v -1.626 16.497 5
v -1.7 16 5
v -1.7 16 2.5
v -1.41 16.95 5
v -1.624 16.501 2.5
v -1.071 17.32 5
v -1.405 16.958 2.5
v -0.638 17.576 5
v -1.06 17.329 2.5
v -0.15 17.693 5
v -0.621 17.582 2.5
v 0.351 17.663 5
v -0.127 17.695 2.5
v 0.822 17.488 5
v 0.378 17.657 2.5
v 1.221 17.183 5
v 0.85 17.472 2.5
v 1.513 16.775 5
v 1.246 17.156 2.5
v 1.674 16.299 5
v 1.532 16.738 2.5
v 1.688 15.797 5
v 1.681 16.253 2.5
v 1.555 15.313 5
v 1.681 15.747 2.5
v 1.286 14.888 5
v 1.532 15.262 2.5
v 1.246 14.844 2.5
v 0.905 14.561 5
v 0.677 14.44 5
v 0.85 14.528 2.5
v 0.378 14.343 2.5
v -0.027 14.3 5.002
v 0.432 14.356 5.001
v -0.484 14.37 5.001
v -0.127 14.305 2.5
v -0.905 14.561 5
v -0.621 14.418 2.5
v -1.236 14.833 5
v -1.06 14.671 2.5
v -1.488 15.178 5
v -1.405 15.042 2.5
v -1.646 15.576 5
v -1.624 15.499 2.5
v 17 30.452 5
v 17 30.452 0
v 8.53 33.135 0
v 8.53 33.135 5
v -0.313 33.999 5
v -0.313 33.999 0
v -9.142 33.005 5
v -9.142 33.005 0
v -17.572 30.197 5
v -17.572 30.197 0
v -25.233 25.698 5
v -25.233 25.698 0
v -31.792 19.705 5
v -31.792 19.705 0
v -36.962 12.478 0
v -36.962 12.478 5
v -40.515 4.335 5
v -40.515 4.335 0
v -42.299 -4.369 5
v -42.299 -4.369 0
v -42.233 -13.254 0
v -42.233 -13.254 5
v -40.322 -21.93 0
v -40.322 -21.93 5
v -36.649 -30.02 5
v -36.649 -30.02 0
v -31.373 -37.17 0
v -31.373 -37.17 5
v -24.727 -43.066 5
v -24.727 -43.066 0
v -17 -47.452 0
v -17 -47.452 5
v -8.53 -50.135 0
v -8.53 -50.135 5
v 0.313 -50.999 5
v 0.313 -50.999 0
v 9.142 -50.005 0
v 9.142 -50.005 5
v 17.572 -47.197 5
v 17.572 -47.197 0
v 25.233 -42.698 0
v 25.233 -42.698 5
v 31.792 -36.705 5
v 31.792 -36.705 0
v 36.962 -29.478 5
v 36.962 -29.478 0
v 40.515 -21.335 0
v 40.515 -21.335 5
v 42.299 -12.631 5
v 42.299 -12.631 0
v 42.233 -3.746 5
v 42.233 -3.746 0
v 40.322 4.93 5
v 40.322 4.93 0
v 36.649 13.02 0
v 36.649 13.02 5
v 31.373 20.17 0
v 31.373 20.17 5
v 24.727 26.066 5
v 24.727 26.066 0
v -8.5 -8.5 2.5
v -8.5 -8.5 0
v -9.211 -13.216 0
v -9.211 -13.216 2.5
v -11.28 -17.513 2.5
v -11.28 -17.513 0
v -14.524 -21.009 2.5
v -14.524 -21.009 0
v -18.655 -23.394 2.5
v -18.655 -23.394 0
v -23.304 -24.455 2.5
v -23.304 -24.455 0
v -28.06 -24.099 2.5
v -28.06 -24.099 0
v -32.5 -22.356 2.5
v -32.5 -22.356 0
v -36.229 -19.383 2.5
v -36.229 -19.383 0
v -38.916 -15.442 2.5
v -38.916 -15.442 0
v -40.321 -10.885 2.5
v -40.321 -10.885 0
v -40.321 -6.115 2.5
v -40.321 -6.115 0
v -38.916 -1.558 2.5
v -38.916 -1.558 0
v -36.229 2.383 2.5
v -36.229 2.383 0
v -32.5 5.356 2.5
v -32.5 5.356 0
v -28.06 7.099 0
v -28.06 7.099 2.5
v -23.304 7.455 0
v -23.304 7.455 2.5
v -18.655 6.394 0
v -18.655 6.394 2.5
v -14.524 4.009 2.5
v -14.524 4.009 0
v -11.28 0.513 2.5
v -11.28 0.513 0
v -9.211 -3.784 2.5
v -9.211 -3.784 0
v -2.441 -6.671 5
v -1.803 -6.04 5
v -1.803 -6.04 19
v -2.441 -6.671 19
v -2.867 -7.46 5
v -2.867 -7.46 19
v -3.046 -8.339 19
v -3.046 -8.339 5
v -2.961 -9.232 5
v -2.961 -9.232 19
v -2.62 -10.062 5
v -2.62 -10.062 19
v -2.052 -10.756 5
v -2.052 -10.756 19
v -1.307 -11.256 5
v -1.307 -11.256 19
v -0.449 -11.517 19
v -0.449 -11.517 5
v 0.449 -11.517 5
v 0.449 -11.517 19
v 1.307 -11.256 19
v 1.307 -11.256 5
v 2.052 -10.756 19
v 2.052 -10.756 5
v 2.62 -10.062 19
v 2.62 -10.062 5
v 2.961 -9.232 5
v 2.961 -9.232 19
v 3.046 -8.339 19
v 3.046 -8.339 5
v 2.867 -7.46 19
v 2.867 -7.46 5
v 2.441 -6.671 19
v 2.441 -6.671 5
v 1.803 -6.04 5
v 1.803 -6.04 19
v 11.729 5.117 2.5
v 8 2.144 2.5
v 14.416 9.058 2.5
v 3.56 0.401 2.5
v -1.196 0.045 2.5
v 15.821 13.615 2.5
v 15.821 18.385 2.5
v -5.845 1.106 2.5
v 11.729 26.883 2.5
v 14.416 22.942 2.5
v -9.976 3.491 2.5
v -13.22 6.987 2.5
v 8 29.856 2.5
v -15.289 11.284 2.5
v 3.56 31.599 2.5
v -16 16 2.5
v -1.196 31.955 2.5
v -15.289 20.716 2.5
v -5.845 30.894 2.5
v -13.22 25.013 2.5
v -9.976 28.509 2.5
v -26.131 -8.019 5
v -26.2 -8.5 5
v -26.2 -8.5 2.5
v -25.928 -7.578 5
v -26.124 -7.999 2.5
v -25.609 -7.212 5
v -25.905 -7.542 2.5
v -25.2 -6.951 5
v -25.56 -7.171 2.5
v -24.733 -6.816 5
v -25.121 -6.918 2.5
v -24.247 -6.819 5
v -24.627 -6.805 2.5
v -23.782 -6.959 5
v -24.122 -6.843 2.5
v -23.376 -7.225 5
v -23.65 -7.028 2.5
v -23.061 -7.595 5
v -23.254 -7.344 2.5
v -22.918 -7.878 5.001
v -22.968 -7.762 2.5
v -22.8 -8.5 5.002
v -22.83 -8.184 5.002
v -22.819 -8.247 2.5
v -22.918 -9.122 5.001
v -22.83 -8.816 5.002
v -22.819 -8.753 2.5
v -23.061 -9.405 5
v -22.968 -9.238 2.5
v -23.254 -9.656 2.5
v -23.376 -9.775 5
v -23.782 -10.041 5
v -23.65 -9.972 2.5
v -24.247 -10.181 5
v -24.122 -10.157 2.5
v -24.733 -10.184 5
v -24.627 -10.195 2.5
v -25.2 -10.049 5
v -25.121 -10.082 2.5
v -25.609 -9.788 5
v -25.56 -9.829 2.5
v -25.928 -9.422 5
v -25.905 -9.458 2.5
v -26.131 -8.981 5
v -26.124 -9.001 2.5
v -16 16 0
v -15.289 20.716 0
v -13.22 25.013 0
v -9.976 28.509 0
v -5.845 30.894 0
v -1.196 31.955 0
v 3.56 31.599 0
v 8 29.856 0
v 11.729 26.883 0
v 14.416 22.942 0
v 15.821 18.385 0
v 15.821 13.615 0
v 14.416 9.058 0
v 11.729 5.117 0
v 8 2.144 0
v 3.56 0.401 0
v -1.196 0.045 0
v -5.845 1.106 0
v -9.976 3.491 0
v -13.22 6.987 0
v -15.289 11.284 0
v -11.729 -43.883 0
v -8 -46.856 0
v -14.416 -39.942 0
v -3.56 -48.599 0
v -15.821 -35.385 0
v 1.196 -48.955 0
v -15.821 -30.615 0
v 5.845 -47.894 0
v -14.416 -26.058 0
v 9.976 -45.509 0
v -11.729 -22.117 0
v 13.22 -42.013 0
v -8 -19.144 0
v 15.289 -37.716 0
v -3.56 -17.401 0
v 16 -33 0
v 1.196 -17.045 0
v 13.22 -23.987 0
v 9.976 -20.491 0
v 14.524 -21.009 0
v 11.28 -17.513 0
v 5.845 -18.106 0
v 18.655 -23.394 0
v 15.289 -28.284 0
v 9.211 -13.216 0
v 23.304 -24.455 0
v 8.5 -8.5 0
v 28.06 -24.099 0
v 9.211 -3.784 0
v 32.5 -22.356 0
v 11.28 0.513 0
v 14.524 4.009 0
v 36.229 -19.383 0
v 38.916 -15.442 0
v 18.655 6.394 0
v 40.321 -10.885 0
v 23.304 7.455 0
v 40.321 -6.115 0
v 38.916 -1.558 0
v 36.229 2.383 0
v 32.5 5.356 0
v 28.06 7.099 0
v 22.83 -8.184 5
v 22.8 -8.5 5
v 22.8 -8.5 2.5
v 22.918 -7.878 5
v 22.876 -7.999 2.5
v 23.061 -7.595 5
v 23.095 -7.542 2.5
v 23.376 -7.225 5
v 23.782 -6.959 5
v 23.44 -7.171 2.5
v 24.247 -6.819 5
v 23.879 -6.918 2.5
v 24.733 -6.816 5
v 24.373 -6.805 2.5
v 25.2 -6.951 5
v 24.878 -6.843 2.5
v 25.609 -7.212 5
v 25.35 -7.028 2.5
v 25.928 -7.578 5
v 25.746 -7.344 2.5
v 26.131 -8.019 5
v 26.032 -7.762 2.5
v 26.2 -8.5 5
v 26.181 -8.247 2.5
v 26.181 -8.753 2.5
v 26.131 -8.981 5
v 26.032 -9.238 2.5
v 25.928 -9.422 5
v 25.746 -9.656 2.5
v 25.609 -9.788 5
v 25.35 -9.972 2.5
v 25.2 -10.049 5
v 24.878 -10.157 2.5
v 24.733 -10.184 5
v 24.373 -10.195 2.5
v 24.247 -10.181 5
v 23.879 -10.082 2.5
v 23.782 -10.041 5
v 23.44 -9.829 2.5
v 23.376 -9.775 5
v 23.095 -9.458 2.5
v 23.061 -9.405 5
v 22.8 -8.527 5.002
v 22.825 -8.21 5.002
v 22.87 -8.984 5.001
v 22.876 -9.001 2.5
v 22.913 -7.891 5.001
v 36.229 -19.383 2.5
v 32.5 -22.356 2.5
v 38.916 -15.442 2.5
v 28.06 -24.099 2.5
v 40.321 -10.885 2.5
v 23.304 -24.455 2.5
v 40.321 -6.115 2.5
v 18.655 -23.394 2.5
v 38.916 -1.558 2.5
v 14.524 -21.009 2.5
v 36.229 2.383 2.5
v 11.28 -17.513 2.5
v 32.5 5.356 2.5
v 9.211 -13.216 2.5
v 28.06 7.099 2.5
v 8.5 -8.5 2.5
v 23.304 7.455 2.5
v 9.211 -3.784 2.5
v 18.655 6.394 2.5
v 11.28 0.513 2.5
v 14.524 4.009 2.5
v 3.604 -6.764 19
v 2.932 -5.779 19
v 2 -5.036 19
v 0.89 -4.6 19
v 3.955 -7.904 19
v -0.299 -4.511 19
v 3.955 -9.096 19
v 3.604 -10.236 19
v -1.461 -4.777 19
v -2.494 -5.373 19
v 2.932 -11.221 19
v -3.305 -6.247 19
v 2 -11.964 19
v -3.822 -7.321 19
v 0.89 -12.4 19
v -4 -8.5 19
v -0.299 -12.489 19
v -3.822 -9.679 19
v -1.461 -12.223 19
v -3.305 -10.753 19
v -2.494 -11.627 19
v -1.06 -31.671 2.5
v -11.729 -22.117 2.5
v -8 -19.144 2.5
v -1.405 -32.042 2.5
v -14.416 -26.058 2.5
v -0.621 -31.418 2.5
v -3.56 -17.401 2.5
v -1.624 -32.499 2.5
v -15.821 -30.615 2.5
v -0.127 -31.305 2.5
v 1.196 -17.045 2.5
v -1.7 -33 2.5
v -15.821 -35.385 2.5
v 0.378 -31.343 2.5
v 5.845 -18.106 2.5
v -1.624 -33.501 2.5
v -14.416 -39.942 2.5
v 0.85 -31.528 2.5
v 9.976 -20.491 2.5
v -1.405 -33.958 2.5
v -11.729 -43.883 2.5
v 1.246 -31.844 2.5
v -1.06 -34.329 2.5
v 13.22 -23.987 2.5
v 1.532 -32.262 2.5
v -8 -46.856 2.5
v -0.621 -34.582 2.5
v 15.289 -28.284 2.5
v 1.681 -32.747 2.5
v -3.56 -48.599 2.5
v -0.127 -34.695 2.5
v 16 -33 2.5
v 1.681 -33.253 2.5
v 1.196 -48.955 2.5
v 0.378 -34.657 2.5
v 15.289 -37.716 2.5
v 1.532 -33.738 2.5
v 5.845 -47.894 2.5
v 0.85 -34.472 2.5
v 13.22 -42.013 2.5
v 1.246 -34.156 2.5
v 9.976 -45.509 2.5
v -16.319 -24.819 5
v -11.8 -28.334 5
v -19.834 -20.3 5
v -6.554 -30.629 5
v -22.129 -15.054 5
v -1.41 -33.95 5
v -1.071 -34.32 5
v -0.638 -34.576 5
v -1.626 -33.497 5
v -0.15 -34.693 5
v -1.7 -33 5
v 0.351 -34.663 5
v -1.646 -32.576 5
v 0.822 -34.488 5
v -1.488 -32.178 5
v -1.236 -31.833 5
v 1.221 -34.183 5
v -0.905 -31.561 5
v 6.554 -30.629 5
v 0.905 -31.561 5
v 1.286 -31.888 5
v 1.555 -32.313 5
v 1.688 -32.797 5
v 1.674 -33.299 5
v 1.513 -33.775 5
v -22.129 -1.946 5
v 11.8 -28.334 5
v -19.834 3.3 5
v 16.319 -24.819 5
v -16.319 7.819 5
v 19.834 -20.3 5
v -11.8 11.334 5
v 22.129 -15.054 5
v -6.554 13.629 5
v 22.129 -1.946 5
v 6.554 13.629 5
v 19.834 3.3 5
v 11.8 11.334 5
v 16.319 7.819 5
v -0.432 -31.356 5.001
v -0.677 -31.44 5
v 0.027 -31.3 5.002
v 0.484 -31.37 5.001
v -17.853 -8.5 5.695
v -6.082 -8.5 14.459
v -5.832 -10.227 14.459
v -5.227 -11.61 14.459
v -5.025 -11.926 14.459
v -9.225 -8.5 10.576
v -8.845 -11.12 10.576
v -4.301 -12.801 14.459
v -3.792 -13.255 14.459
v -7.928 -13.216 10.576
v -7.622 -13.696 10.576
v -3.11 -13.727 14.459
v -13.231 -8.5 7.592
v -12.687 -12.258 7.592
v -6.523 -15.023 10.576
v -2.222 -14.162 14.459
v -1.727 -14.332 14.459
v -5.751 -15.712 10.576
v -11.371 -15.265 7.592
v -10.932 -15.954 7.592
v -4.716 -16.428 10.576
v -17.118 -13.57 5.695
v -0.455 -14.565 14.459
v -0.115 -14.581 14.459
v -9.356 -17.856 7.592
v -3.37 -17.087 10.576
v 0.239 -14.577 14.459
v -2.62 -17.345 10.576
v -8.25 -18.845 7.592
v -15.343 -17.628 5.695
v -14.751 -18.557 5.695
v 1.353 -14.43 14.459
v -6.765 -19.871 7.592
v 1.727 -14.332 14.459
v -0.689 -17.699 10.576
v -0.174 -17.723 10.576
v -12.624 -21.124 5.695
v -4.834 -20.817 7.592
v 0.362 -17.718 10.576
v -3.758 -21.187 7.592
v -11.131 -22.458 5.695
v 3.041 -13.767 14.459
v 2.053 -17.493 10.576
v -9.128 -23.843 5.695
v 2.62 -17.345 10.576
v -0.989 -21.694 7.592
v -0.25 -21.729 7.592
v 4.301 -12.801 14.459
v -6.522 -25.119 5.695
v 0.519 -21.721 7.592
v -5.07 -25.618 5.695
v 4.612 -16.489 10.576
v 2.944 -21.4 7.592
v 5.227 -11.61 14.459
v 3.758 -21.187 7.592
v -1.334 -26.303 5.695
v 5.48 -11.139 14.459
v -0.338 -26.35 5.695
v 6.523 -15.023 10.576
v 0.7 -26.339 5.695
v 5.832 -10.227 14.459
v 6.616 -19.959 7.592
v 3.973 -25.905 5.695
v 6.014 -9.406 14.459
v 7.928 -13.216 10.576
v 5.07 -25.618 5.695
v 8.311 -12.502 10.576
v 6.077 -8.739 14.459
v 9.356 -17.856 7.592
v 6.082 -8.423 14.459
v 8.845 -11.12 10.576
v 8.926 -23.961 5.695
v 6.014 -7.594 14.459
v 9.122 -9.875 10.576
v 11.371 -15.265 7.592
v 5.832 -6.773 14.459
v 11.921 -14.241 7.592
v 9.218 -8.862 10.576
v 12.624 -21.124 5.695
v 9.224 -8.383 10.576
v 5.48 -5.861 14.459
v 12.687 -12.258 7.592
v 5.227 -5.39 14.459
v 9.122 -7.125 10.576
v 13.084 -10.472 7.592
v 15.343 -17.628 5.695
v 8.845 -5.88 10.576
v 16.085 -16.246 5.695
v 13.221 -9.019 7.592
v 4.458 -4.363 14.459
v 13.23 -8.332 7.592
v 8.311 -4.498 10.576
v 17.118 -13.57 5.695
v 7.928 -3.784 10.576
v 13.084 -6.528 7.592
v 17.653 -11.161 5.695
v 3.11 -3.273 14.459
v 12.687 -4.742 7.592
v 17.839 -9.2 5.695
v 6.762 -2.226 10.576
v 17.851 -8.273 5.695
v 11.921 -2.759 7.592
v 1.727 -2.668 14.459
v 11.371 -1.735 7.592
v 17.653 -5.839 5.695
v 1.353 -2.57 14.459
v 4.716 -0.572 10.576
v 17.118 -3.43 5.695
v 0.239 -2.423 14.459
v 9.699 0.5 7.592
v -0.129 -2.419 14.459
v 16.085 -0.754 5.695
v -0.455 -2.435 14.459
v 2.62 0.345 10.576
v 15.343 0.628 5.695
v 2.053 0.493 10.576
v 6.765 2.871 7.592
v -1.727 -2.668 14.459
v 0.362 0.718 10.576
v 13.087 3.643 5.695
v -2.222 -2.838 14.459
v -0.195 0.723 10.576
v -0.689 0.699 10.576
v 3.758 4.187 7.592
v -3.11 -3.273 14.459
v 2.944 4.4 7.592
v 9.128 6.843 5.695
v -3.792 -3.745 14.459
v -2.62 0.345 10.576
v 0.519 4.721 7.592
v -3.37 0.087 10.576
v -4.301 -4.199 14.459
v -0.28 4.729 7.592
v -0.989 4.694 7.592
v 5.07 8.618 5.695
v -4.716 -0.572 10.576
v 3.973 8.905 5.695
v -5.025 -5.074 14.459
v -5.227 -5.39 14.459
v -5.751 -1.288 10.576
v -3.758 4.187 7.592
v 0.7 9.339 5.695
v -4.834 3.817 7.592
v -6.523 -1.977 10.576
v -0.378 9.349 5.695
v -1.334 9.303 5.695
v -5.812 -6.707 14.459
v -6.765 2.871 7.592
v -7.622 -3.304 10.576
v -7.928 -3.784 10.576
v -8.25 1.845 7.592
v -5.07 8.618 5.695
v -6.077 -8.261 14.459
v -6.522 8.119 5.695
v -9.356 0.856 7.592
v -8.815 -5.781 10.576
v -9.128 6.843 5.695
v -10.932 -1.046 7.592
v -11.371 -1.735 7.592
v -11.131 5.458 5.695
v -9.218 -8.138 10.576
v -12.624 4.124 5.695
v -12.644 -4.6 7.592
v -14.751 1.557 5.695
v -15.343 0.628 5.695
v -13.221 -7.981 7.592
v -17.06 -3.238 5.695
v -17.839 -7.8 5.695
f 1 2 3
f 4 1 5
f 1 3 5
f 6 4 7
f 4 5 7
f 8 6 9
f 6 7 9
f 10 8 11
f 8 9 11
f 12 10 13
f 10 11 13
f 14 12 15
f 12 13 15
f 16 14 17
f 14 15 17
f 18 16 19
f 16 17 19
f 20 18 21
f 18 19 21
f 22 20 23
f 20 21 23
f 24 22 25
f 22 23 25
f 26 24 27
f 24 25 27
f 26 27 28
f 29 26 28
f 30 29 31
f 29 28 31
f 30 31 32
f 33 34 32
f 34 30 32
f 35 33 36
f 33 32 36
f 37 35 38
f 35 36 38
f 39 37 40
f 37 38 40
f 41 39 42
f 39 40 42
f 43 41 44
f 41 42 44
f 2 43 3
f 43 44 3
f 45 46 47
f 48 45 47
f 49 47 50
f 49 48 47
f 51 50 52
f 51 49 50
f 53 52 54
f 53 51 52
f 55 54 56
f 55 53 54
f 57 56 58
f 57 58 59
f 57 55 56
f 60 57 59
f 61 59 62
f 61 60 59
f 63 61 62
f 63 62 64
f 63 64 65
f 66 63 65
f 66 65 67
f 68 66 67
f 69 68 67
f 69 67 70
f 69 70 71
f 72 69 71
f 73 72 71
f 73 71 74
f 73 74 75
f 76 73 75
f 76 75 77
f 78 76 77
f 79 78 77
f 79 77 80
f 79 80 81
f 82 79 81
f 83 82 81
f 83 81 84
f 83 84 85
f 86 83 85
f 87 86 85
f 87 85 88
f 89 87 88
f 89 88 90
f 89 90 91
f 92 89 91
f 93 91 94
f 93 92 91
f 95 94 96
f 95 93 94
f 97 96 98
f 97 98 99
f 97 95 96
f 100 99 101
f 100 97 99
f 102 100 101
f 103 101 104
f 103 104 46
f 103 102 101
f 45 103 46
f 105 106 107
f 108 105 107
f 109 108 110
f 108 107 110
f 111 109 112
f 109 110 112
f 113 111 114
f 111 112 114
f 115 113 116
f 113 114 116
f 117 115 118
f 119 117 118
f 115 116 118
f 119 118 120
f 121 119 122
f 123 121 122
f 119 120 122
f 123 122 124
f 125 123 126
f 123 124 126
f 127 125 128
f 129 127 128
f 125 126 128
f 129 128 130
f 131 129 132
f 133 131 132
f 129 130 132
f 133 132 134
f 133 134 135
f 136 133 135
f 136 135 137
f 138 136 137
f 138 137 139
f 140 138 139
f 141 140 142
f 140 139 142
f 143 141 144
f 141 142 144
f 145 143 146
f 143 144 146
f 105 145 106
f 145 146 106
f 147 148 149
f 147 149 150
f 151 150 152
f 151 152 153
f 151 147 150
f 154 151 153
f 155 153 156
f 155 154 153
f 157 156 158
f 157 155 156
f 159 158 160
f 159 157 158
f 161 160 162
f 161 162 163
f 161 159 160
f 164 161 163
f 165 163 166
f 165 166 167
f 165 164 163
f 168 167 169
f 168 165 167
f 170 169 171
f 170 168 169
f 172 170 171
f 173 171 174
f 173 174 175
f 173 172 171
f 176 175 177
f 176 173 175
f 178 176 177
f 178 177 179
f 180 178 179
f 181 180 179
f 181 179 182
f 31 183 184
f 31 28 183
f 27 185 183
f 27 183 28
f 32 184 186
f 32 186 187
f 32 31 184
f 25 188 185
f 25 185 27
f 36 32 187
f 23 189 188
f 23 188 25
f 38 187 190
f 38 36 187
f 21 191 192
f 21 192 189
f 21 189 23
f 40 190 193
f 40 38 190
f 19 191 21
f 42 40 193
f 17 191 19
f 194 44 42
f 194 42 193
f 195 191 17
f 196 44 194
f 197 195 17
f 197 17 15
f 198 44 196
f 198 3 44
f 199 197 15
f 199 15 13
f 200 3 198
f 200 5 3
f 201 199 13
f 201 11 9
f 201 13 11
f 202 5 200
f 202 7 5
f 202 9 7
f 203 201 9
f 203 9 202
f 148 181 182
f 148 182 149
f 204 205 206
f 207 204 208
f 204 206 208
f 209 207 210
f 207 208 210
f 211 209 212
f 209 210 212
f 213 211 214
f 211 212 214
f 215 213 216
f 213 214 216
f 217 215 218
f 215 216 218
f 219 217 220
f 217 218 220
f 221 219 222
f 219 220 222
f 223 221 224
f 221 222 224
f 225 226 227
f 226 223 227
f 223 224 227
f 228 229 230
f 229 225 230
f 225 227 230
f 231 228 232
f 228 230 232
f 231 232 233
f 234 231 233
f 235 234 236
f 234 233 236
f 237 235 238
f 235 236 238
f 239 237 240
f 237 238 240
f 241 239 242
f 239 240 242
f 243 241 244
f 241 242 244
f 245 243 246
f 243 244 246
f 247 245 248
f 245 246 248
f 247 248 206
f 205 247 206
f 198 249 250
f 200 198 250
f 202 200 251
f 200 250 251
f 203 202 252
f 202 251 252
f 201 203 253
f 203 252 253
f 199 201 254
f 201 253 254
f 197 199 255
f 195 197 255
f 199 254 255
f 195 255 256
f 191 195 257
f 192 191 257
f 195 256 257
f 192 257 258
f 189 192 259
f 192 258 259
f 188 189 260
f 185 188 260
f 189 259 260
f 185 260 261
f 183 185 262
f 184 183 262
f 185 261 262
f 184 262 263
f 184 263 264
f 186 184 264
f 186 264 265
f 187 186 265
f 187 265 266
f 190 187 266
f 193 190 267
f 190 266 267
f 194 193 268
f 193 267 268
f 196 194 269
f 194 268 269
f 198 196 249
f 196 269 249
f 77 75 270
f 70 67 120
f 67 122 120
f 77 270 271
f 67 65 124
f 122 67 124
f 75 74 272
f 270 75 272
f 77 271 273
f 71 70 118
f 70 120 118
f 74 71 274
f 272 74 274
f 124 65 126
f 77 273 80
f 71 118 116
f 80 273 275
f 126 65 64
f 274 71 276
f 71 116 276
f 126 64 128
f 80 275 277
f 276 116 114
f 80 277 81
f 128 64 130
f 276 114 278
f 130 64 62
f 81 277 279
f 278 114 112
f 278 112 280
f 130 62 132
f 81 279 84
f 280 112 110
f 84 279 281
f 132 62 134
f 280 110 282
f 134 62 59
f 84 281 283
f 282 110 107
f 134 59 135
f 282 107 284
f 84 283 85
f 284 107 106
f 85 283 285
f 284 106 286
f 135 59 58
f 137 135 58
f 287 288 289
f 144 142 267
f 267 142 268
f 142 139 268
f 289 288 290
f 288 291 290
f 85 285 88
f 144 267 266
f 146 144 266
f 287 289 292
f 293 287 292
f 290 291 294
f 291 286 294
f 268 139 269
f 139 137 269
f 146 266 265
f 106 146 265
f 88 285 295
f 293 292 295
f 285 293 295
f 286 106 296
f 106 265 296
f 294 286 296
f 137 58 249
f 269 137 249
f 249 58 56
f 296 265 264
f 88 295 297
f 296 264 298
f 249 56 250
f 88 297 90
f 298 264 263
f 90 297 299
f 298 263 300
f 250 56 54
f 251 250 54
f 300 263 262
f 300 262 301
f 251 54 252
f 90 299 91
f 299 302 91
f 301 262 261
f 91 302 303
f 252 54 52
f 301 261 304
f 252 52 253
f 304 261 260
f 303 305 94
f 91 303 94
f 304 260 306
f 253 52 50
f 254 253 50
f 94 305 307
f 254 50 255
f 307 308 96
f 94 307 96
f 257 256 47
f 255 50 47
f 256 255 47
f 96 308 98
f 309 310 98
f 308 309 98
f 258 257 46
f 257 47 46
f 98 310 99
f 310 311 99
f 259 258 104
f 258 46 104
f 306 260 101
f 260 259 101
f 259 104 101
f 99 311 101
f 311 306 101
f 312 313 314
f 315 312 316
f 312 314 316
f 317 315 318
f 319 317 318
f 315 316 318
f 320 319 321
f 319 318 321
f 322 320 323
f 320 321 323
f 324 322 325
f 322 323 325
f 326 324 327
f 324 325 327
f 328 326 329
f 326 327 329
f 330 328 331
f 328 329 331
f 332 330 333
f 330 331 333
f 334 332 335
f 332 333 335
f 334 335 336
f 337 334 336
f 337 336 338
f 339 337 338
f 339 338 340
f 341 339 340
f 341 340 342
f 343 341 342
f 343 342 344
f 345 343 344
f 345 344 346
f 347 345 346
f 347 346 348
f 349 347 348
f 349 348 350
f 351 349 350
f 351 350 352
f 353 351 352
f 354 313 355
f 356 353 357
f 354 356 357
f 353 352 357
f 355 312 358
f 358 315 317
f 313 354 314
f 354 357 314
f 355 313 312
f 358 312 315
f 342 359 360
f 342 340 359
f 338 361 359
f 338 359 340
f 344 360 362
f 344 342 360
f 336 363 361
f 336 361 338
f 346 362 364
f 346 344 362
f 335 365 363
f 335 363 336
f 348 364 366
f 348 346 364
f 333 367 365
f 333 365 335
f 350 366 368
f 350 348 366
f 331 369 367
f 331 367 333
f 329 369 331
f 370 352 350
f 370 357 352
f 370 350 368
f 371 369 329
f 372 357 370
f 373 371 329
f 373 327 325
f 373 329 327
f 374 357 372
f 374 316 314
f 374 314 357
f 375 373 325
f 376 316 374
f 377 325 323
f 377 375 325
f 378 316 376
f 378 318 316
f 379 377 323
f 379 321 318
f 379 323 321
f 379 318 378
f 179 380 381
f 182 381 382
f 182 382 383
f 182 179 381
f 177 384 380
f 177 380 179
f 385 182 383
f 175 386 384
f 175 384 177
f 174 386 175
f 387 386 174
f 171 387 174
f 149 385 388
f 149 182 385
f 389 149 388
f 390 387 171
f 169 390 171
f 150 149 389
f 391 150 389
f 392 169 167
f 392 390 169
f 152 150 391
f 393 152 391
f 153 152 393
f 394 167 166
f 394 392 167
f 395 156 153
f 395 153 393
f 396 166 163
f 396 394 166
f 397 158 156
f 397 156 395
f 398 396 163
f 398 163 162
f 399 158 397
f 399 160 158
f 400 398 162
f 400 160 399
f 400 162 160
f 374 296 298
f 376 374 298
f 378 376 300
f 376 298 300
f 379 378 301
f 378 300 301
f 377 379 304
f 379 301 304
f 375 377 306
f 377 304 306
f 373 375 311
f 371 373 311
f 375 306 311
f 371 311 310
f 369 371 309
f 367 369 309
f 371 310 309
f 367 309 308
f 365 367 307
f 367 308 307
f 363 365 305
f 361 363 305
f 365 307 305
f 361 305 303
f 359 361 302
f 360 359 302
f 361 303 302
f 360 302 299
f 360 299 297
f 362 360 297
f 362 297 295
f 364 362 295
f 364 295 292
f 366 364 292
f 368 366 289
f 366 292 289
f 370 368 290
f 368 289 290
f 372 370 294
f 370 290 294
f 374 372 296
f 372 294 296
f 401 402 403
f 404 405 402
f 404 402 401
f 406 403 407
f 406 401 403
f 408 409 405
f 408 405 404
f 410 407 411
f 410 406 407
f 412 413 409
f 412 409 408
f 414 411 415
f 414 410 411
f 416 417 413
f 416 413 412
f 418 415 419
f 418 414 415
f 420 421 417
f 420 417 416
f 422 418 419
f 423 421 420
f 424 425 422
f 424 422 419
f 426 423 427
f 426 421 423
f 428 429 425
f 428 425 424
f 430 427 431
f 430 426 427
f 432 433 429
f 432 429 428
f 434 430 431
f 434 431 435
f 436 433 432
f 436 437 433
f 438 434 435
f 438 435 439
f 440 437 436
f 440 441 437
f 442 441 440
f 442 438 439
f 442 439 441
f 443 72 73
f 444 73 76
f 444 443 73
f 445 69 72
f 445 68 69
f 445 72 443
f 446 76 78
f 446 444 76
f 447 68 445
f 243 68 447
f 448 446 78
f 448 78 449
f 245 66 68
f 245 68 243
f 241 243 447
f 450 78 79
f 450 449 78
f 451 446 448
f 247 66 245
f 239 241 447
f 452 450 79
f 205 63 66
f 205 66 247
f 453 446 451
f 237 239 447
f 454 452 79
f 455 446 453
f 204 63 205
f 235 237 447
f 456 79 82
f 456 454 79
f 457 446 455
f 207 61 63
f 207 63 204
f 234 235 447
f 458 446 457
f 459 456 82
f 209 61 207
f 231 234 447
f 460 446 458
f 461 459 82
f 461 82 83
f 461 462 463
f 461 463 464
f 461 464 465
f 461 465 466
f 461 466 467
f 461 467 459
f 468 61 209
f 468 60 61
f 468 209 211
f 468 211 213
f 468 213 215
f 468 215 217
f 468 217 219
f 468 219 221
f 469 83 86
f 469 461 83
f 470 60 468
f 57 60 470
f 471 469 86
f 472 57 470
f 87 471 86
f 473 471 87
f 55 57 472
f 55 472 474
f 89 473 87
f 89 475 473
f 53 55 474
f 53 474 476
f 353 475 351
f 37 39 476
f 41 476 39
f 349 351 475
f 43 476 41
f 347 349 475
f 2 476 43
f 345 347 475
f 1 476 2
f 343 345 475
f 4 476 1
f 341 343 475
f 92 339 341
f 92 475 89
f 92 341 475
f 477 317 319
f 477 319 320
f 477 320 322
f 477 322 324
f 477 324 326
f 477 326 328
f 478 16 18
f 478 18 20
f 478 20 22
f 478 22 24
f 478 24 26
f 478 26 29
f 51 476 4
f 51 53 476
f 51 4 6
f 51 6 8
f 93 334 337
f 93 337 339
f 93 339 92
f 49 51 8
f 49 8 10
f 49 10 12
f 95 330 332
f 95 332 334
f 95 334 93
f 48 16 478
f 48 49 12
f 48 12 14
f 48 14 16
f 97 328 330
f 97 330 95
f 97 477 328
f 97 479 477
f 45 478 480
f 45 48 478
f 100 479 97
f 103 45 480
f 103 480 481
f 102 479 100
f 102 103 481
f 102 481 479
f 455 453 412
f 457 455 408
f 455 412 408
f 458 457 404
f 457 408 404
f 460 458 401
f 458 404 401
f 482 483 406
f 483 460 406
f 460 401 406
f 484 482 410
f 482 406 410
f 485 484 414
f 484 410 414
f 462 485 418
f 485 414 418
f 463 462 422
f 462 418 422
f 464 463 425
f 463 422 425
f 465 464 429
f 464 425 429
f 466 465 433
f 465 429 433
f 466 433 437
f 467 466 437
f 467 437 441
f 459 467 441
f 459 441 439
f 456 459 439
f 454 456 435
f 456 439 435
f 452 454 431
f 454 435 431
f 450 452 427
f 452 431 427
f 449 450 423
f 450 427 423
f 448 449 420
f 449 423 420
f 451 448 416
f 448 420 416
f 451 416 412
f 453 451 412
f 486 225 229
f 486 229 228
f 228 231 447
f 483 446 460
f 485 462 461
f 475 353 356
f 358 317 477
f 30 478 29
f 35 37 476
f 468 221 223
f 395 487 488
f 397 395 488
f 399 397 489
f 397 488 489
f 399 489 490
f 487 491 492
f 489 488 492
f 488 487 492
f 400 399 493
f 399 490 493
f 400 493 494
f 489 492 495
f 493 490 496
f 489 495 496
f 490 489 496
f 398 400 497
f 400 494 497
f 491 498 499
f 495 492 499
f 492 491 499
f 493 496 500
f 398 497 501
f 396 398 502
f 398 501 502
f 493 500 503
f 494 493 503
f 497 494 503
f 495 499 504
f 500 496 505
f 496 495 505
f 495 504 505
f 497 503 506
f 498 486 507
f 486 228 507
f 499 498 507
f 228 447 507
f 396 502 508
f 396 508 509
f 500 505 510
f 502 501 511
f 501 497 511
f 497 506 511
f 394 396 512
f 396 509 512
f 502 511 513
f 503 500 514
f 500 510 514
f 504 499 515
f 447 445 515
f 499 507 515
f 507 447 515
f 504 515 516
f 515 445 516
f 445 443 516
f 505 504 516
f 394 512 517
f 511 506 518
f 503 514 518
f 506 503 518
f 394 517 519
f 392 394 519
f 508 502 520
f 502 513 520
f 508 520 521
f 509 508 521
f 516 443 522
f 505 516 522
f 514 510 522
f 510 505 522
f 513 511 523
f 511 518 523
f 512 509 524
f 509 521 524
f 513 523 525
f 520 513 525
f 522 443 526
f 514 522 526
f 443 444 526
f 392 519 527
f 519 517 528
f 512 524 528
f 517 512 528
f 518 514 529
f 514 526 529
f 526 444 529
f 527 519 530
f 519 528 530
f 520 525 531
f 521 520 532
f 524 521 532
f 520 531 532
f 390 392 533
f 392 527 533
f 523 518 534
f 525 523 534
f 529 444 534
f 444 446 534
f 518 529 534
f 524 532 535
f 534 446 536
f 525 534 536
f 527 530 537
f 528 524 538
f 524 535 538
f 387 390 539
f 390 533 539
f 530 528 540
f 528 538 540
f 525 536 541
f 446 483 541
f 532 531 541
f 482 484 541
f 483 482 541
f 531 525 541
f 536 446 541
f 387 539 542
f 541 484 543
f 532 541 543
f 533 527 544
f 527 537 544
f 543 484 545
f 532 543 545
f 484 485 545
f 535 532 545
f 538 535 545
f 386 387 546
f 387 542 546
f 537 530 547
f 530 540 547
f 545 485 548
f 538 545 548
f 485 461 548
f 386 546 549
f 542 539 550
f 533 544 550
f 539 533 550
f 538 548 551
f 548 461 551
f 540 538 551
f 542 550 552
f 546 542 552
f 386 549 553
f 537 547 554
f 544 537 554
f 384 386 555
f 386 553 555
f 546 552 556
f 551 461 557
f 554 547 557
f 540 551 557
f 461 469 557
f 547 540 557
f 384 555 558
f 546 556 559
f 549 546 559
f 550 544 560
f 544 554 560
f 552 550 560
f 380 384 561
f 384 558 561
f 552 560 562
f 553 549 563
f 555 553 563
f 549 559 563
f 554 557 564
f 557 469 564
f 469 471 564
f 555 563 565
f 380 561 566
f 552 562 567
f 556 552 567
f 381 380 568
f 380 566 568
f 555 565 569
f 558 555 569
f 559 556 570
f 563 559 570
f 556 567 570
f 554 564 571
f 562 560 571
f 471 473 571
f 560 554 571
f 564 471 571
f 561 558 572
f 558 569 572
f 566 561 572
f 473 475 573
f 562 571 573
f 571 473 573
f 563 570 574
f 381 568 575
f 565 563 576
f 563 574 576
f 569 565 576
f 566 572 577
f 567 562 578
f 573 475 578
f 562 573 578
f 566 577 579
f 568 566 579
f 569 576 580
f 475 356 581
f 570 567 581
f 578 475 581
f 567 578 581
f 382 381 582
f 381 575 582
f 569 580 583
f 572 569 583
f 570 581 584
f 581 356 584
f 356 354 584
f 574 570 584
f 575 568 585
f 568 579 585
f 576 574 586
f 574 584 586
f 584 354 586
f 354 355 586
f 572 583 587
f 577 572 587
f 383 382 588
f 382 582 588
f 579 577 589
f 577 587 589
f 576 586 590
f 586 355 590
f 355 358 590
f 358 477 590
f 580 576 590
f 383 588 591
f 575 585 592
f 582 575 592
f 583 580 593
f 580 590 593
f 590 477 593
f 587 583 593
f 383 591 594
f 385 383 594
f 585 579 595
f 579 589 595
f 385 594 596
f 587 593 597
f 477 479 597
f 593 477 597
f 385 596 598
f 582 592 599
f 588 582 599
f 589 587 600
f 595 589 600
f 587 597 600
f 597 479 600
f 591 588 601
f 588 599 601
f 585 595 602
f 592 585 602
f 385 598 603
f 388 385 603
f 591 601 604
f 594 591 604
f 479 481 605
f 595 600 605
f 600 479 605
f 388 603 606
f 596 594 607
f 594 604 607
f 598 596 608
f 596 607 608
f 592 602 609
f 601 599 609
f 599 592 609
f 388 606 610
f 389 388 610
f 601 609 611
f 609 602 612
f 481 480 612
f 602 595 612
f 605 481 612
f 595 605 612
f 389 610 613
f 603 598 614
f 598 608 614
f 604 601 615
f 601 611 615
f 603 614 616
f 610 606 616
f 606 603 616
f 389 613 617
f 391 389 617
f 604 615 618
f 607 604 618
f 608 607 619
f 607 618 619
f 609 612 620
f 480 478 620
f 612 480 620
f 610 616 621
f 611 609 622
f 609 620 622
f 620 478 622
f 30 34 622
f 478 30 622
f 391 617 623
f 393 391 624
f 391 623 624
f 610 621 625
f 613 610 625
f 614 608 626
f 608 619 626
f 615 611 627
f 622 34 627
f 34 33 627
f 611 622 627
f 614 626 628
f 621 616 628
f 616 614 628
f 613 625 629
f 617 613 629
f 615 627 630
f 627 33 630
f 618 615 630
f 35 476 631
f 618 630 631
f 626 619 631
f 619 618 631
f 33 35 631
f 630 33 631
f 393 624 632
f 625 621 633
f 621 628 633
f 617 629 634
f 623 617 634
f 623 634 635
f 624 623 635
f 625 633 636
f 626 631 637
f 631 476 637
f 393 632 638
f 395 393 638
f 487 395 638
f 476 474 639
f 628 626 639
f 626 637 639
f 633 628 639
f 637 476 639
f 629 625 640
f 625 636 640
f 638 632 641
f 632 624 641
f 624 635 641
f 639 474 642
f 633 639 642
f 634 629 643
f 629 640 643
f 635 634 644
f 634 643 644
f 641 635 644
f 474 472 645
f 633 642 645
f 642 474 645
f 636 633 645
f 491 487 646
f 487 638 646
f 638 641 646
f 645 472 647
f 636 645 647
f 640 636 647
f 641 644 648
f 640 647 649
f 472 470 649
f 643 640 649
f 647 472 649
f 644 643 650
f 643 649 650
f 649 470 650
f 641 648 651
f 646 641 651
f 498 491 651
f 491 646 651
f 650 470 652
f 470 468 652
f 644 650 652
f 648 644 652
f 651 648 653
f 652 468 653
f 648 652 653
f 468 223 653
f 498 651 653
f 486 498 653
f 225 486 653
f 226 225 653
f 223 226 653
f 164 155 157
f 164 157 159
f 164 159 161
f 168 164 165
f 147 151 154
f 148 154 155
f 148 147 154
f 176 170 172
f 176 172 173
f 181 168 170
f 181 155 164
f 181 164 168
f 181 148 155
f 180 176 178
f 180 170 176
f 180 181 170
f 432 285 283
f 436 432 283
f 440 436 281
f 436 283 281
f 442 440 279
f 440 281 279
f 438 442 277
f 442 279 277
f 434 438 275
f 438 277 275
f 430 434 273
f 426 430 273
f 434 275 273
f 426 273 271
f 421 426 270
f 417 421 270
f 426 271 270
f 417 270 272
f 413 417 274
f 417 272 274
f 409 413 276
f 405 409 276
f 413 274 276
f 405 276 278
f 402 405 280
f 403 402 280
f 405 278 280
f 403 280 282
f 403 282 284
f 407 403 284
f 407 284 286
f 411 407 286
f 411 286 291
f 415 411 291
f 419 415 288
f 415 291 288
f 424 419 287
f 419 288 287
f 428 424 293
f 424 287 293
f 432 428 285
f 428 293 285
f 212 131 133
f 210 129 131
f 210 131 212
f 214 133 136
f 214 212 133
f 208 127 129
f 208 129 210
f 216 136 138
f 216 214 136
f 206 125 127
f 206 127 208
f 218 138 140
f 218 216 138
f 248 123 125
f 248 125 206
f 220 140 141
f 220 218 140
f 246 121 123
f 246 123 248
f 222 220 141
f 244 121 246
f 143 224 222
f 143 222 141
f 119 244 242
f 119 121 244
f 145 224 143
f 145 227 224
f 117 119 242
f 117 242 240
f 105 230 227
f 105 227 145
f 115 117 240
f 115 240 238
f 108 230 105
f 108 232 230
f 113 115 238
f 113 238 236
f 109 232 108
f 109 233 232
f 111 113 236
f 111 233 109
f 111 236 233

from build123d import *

# Parameters (mm, degrees)
BOSS_EXTRUDE2_DEPTH = 5
SKETCH5_R           = 4
BOSS_EXTRUDE3_DEPTH = 7
SKETCH6_R           = 15.5
CUT_EXTRUDE1_DEPTH  = 4
SKETCH7_R           = 1.8
CUT_EXTRUDE2_DEPTH  = 4
CUT_EXTRUDE3_DEPTH  = 6
CUT_EXTRUDE4_DEPTH  = 7
SKETCH11_R          = 4
BOSS_EXTRUDE4_DEPTH = 7
SKETCH12_R          = 42.5
BOSS_EXTRUDE5_DEPTH = 5
SKETCH13_R          = 45.773900861
SKETCH13_R_2        = 42.5
CUT_EXTRUDE5_DEPTH  = 5
SKETCH14_R          = 16
CUT_EXTRUDE6_DEPTH  = 2.5
SKETCH15_R          = 1.7
CUT_EXTRUDE7_DEPTH  = 2.5
CUT_EXTRUDE8_START  = -14
CUT_EXTRUDE8_DEPTH  = 14
FILLET1_R           = 20


with BuildPart() as part:
    # Sketch4 → Boss-Extrude2 (new body)
    with BuildSketch(Plane.XY):
        with BuildLine():
            Line((-17, 0), (-17, 34))
            Line((-17, 34), (17, 34))
            Line((17, 34), (17, 0))
            ThreePointArc((17, 0), (0, -17), (-17, 0))
        make_face()
    extrude(amount=BOSS_EXTRUDE2_DEPTH)

    # Sketch5 → Boss-Extrude3 (add)
    with BuildSketch(Plane.XY.offset(5)):
        with Locations(Location((0, -8.5, 0), (0, 0, 180))):
            Circle(SKETCH5_R)
    extrude(amount=BOSS_EXTRUDE3_DEPTH)

    # Sketch6 → Cut-Extrude1 (cut)
    with BuildSketch(Plane(origin=(0, 0, 0), x_dir=(-1, 0, 0), z_dir=(0, 0, -1))):
        with Locations((0, 17.71586122)):
            Circle(SKETCH6_R)
    extrude(amount=-CUT_EXTRUDE1_DEPTH, mode=Mode.SUBTRACT)

    # Sketch7 → Cut-Extrude2 (cut)
    with BuildSketch(Plane(origin=(0, 0, 4), x_dir=(-1, 0, 0), z_dir=(0, 0, -1))):
        with Locations((0, 17.71586122)):
            Circle(SKETCH7_R)
    extrude(amount=-CUT_EXTRUDE2_DEPTH, mode=Mode.SUBTRACT)

    # Sketch8 → Cut-Extrude3 (cut)
    with BuildSketch(Plane.XY.offset(12)):
        with BuildLine():
            Line((-1.405880507, -7.12), (1.405880507, -7.12))
            ThreePointArc((1.405880507, -7.12), (0, -10.47), (-1.405880507, -7.12))
        make_face()
    extrude(amount=-CUT_EXTRUDE3_DEPTH, mode=Mode.SUBTRACT)

    # Sketch10 → Cut-Extrude4 (cut)
    with BuildSketch(Plane.XY.offset(12)):
        with BuildLine():
            Line((1.439062195, -7.04), (-1.439062195, -7.04))
            ThreePointArc((-1.439062195, -7.04), (0, -10.55), (1.439062195, -7.04))
        make_face()
    extrude(amount=-CUT_EXTRUDE4_DEPTH, mode=Mode.SUBTRACT)

    # Sketch11 → Boss-Extrude4 (add)
    with BuildSketch(Plane.XY.offset(12)):
        with Locations(Location((0, -8.5, 0), (0, 0, 180))):
            Circle(SKETCH11_R)
        with BuildLine():
            Line((1.439062195, -7.04), (-1.439062195, -7.04))
            ThreePointArc((-1.439062195, -7.04), (0, -10.55), (1.439062195, -7.04))
        make_face(mode=Mode.SUBTRACT)
    extrude(amount=BOSS_EXTRUDE4_DEPTH)

    # Sketch12 → Boss-Extrude5 (add)
    with BuildSketch(Plane.XY.offset(5)):
        with Locations((0, -8.5)):
            Circle(SKETCH12_R)
    extrude(amount=-BOSS_EXTRUDE5_DEPTH)

    # Sketch13 → Cut-Extrude5 (cut)
    with BuildSketch(Plane.XY.offset(5)):
        with Locations((0, -8.5)):
            Circle(SKETCH13_R)
        with Locations((0, -8.5)):
            Circle(SKETCH13_R_2, mode=Mode.SUBTRACT)
    extrude(amount=-CUT_EXTRUDE5_DEPTH, mode=Mode.SUBTRACT)

    # Sketch14 → Cut-Extrude6 (cut)
    with BuildSketch(Plane(origin=(0, 0, 0), x_dir=(-1, 0, 0), z_dir=(0, 0, -1))):
        with Locations((0, 16)):
            Circle(SKETCH14_R)
        with Locations(Location((0, -33, 0), (0, 0, 180))):
            Circle(SKETCH14_R)
        with Locations((-24.5, -8.5)):
            Circle(SKETCH14_R)
        with Locations(Location((24.5, -8.5, 0), (0, 0, 180))):
            Circle(SKETCH14_R)
    extrude(amount=-CUT_EXTRUDE6_DEPTH, mode=Mode.SUBTRACT)

    # Sketch15 → Cut-Extrude7 (cut)
    with BuildSketch(Plane(origin=(0, 0, 2.5), x_dir=(-1, 0, 0), z_dir=(0, 0, -1))):
        with Locations((0, 16)):
            Circle(SKETCH15_R)
        with Locations((-24.5, -8.5)):
            Circle(SKETCH15_R)
        with Locations((24.5, -8.5)):
            Circle(SKETCH15_R)
        with Locations((0, -33)):
            Circle(SKETCH15_R)
    extrude(amount=-CUT_EXTRUDE7_DEPTH, mode=Mode.SUBTRACT)

    # Sketch16 → Cut-Extrude8 (cut)
    with BuildSketch(Plane.XY.offset(19).offset(CUT_EXTRUDE8_START)):
        with BuildLine():
            Line((1.803025236, -6.04), (-1.803025236, -6.04))
            ThreePointArc((-1.803025236, -6.04), (0, -11.55), (1.803025236, -6.04))
        make_face()
        with BuildLine():
            Line((1.439062195, -7.04), (-1.439062195, -7.04))
            ThreePointArc((-1.439062195, -7.04), (0, -10.55), (1.439062195, -7.04))
        make_face(mode=Mode.SUBTRACT)
    extrude(amount=CUT_EXTRUDE8_DEPTH, mode=Mode.SUBTRACT)

    # Fillet1
    # the kernel refuses this fillet: 20 mm, written as the material it adds along each edge
    with BuildSketch(Plane(origin=(0, -8.5, 5), x_dir=(-1, 0, 0), z_dir=(0, 1, 0))) as fillet1_piece_1_section:
        with BuildLine():
            CenterArc((23.078784028, 20), FILLET1_R, 197.457603124, 72.542396876)
            Line((4, 14), (3.618424319, 13.88))
            ThreePointArc((3.618424319, 13.88), (3.6, 7), (3.6, 0))
            Line((3.6, 0), (4, -0.4))
            Line((4, -0.4), (23.078784028, -0.4))
            Line((23.078784028, -0.4), (23.078784028, 0))
        make_face()
    fillet1_piece_1 = revolve(axis=Axis((0, -8.5, 5), (0, 0, 1)), mode=Mode.PRIVATE)
    fillet1_piece_1 = fillet1_piece_1 - Plane(origin=(0, -33, 8.742108551), x_dir=(-1, 0, 0), z_dir=(0, 0, -1)) * Cylinder(1.7, 93, mode=Mode.PRIVATE)
    fillet1_piece_1 = fillet1_piece_1 - Plane(origin=(-24.5, -8.5, 8.742108551), x_dir=(-1, 0, 0), z_dir=(0, 0, -1)) * Cylinder(1.7, 93, mode=Mode.PRIVATE)
    fillet1_piece_1 = fillet1_piece_1 - Plane(origin=(0, 16, 8.742108551), x_dir=(-1, 0, 0), z_dir=(0, 0, -1)) * Cylinder(1.7, 93, mode=Mode.PRIVATE)
    fillet1_piece_1 = fillet1_piece_1 - Plane(origin=(24.5, -8.5, 8.742108551), x_dir=(-1, 0, 0), z_dir=(0, 0, -1)) * Cylinder(1.7, 93, mode=Mode.PRIVATE)
    add(fillet1_piece_1)


solid = part.part
